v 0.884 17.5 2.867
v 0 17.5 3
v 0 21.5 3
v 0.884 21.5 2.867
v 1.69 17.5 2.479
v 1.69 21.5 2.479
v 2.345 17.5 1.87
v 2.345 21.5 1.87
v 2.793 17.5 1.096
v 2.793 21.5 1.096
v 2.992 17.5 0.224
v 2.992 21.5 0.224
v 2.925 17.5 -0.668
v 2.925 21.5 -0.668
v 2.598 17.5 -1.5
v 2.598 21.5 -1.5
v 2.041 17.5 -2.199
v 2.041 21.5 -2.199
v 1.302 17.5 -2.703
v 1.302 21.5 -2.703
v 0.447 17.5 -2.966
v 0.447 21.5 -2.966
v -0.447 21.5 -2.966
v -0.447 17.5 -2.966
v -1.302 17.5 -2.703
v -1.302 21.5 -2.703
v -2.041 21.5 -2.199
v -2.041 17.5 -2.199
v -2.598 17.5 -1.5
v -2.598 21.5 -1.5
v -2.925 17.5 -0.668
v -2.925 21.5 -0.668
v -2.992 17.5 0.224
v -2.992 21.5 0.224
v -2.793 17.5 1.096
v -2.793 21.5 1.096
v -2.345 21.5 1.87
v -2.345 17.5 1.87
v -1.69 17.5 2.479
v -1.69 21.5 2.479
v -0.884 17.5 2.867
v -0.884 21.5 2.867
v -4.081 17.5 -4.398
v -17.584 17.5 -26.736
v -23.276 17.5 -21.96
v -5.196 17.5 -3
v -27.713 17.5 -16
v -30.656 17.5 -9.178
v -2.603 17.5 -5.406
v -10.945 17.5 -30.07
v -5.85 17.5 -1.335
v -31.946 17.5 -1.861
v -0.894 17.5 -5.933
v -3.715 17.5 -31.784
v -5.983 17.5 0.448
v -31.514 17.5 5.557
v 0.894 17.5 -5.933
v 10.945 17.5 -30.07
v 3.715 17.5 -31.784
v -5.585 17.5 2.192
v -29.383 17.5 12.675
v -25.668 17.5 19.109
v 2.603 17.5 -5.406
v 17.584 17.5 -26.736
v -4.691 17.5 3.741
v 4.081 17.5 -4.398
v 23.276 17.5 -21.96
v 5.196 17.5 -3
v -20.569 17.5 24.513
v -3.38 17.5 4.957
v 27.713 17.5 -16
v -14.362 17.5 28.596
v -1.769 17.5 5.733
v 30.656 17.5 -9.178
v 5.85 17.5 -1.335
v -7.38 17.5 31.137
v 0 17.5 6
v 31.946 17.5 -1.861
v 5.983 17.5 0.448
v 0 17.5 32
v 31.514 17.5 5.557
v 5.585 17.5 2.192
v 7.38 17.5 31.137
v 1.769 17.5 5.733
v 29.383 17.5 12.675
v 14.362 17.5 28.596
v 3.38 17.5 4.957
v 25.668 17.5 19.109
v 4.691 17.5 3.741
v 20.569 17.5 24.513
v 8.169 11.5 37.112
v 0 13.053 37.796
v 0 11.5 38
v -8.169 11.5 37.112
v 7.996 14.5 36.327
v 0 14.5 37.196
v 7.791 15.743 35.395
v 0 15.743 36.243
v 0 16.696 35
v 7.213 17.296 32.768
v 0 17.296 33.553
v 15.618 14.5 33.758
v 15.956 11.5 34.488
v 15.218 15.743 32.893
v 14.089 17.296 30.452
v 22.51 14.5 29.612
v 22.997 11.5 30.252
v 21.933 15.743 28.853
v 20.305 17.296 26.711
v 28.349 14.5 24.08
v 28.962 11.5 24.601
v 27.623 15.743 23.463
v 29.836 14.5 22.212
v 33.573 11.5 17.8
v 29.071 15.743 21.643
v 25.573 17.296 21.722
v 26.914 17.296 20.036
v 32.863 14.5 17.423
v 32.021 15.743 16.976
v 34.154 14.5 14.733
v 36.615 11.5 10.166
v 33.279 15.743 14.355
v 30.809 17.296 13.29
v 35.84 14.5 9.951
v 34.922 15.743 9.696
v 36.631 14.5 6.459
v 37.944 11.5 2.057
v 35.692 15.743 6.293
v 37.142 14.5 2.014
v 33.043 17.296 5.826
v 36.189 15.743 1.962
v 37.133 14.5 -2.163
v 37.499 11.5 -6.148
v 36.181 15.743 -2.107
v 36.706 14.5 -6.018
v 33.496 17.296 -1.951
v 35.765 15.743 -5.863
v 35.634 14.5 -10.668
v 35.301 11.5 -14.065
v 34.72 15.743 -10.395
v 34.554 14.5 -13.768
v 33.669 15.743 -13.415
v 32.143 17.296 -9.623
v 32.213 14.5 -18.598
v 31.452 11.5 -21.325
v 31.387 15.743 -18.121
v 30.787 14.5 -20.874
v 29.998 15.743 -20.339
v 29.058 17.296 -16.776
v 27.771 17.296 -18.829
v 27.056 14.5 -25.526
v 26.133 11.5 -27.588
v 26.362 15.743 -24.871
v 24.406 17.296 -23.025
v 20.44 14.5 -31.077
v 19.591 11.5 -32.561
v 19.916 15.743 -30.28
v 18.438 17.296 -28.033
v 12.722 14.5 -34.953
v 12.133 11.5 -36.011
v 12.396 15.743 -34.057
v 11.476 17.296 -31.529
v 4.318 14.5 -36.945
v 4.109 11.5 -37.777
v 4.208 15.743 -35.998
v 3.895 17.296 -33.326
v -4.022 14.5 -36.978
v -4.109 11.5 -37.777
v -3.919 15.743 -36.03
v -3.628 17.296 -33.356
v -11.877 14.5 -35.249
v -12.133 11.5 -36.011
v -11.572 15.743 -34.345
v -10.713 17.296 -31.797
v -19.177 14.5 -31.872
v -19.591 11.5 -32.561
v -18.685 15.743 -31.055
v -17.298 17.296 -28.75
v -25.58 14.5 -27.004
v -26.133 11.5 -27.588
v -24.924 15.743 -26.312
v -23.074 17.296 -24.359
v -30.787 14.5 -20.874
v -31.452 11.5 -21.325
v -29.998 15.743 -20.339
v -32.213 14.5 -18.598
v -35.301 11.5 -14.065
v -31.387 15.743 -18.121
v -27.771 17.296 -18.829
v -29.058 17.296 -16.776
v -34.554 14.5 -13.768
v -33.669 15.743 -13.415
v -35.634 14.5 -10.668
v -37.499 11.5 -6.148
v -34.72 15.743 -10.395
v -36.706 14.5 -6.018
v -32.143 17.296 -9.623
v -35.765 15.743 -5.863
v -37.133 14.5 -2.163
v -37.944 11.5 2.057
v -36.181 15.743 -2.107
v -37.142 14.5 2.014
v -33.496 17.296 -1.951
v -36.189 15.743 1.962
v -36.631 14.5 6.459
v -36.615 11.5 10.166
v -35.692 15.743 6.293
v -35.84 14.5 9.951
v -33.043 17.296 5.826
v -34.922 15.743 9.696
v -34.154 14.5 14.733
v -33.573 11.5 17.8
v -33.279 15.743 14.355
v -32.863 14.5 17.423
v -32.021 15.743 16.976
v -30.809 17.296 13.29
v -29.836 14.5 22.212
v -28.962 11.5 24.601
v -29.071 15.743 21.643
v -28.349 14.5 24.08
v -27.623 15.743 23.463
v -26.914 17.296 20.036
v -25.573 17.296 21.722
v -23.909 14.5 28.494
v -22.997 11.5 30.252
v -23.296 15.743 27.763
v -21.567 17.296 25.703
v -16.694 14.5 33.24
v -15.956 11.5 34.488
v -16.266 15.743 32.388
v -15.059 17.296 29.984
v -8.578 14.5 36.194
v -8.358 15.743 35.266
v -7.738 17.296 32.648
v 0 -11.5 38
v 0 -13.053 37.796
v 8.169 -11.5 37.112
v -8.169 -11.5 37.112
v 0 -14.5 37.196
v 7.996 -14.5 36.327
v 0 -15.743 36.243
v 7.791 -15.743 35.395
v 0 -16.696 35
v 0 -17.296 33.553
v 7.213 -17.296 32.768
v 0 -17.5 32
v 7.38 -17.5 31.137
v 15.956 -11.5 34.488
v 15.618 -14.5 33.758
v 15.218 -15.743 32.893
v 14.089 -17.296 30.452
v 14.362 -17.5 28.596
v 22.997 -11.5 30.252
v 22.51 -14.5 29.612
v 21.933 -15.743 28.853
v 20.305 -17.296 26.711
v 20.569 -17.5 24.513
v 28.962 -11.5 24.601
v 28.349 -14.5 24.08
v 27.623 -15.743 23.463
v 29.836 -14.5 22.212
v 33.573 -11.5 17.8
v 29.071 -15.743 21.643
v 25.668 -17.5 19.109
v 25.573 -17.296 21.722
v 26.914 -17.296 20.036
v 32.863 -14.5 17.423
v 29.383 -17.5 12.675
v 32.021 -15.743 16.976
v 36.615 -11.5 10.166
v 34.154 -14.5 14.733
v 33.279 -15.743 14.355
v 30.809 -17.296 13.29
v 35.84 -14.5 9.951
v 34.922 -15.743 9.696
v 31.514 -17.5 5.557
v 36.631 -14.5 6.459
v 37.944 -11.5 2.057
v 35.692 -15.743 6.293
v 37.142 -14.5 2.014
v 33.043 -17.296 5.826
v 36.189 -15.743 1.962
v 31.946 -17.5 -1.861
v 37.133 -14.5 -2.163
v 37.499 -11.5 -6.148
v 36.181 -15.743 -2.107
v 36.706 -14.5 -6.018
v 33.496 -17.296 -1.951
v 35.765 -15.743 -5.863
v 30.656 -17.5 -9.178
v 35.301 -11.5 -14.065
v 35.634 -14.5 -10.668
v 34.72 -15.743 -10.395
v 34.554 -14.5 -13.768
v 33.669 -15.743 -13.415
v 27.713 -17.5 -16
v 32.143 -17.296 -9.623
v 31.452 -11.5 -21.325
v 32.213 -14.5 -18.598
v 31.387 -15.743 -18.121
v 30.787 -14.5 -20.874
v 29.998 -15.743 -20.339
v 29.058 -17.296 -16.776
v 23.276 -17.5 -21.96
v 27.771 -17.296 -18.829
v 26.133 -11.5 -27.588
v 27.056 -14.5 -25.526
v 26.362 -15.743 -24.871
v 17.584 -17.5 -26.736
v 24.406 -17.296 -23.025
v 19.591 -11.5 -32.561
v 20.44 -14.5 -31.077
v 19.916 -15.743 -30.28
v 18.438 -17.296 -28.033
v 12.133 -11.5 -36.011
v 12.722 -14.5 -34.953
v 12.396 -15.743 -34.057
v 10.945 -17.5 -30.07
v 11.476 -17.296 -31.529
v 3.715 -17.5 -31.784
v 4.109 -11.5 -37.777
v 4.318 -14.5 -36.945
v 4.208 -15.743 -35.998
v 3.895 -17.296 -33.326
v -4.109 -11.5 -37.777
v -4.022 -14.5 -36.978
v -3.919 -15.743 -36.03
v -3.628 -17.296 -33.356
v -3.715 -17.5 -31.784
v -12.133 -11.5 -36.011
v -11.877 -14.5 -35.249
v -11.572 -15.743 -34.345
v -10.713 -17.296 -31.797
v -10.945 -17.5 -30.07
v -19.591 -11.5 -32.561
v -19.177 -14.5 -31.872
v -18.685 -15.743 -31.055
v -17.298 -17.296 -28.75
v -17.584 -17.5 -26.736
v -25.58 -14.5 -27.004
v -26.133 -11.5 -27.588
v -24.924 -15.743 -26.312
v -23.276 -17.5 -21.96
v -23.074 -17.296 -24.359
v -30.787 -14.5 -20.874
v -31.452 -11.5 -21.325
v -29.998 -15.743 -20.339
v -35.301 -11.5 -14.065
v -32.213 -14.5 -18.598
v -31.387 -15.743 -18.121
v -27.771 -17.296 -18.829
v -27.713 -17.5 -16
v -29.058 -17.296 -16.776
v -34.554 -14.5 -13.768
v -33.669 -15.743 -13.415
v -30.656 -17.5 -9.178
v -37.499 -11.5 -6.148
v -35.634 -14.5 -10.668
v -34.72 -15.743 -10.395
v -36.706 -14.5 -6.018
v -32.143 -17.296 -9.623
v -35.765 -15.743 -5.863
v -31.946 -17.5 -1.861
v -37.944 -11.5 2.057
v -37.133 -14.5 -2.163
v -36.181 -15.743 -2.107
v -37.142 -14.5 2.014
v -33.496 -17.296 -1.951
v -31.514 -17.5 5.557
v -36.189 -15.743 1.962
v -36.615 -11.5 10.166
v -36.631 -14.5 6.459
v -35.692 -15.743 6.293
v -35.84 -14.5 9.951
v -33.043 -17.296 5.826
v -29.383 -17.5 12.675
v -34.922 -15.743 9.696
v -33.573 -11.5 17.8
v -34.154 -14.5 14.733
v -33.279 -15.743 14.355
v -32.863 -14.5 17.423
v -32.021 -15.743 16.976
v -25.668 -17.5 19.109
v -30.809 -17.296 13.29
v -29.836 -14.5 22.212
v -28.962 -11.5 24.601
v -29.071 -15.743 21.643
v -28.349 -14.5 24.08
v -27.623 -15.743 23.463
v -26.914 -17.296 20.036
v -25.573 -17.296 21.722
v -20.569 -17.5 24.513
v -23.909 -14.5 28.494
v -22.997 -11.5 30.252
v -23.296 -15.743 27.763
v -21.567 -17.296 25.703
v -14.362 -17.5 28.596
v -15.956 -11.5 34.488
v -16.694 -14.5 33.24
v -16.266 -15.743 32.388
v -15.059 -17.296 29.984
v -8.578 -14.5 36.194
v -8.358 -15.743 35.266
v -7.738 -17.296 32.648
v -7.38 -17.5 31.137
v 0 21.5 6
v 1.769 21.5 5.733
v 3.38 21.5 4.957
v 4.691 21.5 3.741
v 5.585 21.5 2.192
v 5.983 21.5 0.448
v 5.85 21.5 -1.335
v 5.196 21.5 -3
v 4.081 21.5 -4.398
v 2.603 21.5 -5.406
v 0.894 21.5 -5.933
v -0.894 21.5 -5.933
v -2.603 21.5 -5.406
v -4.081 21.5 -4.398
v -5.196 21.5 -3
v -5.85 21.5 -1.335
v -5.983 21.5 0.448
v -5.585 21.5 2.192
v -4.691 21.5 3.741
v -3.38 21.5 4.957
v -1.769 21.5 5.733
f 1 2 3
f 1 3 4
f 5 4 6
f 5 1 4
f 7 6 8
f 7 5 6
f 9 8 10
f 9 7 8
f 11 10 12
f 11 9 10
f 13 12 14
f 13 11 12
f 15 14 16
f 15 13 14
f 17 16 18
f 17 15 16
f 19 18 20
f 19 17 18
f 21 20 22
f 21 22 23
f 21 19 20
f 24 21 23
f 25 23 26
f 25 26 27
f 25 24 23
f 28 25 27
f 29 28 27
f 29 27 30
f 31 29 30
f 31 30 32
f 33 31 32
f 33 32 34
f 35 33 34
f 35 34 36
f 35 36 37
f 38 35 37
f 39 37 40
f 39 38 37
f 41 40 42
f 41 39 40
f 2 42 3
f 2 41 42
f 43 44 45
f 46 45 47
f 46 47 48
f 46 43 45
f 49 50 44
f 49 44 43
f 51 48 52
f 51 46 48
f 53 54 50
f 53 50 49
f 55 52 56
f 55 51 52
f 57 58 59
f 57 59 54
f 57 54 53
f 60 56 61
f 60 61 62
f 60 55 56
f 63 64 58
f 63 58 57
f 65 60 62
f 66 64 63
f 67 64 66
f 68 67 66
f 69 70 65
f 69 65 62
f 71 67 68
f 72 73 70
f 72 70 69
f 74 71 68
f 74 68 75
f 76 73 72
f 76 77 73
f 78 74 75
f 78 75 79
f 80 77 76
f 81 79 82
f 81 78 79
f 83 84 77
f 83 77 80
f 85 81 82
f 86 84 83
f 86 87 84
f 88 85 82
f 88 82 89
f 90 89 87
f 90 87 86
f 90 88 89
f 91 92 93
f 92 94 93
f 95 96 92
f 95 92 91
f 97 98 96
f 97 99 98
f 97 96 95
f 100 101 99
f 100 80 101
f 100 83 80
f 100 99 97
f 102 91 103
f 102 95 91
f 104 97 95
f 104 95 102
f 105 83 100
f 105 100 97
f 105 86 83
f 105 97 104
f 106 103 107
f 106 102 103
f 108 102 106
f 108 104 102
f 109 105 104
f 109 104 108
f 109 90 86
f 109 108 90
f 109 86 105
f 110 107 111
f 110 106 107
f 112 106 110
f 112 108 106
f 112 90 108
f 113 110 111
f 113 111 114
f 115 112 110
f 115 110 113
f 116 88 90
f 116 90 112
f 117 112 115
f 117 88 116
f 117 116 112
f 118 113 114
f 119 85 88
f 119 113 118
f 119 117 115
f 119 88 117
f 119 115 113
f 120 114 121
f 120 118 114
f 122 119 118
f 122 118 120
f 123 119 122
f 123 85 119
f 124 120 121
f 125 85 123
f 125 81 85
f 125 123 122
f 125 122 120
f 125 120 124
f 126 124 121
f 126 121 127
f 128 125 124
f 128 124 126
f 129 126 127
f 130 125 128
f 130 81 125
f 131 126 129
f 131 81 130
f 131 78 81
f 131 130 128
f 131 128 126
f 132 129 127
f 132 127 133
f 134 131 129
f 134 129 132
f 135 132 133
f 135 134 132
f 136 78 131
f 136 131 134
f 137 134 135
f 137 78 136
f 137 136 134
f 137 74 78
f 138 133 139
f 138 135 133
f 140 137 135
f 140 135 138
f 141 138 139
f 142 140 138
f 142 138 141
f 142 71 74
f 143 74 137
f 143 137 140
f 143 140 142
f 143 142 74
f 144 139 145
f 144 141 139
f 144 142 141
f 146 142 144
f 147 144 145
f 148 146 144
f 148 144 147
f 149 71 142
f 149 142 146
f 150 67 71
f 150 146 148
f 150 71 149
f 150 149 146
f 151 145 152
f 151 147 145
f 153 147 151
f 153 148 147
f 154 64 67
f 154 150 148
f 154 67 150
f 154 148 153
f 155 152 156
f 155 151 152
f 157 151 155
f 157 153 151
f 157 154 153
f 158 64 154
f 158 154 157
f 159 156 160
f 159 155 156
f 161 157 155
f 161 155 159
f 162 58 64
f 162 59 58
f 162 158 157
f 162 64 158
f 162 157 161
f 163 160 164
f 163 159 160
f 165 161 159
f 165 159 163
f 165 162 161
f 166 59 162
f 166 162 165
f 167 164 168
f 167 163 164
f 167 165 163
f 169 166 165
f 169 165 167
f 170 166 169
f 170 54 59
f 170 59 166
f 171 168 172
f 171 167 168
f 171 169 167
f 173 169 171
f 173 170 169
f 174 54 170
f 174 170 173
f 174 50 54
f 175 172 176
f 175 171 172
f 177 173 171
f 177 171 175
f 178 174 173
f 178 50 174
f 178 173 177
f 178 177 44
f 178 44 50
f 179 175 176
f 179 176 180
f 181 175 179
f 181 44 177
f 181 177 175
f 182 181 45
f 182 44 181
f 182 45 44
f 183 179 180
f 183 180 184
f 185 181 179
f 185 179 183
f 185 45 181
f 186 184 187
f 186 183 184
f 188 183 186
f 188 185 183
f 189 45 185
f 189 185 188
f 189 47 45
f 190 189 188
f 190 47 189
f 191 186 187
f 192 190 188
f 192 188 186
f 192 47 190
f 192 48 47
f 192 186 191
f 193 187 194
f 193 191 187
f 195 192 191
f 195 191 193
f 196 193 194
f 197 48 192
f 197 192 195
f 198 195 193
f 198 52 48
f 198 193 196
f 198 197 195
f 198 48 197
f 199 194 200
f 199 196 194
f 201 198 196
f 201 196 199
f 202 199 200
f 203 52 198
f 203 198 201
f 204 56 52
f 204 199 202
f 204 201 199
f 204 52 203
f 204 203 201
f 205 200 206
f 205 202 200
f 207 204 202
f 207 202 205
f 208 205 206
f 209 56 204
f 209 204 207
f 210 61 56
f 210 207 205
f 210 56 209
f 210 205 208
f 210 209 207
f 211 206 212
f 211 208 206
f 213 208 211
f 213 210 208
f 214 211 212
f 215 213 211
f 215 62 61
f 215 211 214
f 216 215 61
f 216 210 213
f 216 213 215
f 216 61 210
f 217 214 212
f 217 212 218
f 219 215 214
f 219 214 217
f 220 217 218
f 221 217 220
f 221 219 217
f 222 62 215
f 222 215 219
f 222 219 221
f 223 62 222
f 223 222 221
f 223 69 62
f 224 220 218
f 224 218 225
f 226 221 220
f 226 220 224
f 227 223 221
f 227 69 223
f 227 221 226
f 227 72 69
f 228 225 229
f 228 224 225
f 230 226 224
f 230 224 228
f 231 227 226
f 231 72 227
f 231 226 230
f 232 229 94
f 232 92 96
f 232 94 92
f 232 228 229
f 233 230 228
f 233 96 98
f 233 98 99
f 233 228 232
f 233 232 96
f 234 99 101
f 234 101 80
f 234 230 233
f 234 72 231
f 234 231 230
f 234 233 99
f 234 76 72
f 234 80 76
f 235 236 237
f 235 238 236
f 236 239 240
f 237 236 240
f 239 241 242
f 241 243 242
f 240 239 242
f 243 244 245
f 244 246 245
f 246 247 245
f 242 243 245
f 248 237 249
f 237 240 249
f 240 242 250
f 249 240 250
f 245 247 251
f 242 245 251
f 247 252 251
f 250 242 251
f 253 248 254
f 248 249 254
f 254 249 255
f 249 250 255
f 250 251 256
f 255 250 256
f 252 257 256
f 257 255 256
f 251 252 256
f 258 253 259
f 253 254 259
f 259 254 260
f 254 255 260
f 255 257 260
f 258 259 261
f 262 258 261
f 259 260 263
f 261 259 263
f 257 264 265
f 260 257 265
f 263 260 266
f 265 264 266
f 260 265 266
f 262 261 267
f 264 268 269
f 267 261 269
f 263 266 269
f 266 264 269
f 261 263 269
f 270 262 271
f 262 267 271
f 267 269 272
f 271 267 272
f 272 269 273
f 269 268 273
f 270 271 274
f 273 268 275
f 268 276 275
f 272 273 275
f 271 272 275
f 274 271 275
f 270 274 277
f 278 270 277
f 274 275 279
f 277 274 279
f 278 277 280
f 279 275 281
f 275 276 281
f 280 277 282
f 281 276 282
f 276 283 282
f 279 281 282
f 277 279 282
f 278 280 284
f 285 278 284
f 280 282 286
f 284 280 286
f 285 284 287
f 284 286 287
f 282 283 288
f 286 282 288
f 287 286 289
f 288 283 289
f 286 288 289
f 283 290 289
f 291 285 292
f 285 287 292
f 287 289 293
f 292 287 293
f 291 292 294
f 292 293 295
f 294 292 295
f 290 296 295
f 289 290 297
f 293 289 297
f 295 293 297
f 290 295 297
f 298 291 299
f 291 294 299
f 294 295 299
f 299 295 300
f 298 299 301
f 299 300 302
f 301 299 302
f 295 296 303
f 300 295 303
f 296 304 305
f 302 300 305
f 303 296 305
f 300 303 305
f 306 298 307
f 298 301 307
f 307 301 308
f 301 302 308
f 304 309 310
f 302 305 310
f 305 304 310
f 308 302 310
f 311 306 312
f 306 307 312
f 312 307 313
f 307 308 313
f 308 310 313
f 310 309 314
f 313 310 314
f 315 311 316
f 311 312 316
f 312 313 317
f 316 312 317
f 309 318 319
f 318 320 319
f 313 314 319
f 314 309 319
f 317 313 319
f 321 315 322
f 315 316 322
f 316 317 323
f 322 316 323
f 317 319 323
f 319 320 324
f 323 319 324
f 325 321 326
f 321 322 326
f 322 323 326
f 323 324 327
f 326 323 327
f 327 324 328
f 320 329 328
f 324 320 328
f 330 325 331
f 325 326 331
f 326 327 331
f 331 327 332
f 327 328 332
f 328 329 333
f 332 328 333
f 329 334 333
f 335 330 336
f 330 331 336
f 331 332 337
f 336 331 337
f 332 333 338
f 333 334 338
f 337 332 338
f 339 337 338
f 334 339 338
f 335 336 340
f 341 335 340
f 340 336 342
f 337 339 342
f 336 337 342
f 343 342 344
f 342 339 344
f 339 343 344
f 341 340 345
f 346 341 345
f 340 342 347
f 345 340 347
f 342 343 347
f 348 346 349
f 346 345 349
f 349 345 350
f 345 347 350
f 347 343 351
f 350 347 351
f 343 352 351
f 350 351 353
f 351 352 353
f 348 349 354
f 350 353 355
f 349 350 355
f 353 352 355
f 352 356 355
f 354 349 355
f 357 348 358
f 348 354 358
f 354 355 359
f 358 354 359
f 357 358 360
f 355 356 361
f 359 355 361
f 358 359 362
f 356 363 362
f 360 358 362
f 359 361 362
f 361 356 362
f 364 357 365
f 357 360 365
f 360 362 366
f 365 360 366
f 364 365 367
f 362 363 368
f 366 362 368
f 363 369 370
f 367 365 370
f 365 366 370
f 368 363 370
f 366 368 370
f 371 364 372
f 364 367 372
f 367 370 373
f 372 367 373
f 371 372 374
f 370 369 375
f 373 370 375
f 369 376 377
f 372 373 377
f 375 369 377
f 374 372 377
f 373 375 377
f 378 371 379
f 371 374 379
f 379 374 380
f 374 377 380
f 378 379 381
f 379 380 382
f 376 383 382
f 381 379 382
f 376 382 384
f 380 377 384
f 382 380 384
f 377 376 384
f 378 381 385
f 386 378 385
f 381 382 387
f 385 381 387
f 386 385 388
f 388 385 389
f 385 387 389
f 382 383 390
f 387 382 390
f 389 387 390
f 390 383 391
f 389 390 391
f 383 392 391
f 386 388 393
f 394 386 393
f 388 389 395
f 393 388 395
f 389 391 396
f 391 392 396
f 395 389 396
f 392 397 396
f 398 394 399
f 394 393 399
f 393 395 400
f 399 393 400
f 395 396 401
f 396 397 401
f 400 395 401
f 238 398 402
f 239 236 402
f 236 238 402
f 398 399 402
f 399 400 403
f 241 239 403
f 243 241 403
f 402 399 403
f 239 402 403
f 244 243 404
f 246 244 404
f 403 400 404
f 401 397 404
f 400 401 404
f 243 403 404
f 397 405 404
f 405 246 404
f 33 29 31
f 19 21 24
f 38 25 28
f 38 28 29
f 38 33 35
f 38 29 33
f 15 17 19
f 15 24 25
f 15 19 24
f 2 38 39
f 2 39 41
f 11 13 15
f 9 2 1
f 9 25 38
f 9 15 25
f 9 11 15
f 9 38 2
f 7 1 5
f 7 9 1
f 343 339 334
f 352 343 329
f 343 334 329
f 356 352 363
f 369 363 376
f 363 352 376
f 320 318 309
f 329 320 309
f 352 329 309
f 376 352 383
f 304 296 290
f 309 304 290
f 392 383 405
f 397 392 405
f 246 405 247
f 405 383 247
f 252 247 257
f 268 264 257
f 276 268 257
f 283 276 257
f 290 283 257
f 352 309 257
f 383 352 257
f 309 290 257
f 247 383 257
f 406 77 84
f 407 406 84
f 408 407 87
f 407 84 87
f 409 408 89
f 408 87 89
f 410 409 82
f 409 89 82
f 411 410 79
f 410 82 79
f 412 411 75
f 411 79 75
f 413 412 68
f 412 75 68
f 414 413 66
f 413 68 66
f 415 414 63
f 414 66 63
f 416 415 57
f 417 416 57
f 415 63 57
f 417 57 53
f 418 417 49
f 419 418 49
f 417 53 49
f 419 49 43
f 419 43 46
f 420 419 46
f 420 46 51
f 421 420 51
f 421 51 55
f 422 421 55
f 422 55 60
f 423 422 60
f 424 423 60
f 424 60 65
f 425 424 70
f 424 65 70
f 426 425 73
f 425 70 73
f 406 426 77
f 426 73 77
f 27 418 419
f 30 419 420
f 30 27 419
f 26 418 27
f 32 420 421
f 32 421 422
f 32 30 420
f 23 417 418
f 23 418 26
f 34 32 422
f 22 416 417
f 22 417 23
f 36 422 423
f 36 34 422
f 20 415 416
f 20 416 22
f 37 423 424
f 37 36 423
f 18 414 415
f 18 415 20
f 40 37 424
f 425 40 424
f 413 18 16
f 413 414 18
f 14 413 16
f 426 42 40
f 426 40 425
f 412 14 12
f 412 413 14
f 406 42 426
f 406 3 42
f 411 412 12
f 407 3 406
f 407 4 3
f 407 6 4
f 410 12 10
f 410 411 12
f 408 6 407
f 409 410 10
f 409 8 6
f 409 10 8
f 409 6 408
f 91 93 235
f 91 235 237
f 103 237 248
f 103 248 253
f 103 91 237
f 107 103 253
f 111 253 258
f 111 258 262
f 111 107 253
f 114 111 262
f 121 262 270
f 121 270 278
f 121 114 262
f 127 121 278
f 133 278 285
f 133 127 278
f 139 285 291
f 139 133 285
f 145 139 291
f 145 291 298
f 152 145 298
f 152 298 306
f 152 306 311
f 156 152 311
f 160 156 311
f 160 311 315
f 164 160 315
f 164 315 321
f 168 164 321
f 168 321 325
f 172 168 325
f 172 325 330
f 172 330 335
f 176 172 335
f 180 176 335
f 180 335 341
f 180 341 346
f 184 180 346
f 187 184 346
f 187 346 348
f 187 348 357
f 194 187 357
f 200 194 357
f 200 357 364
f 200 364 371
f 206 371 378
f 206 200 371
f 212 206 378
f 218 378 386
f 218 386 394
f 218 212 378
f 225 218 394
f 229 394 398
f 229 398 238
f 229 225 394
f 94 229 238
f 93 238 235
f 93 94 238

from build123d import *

# Parameters (mm, degrees)
SKETCH_1_R      = 38
EXTRUDE_1_DEPTH = 17.5
SKETCH_2_R      = 6
SKETCH_2_R_2    = 3
EXTRUDE_2_DEPTH = 4
FILLET_1_R      = 6


with BuildPart() as part:
    # 草图1 → 凸台-拉伸1 (new, symmetric)
    with BuildSketch(Plane(origin=(0, 0, 0), x_dir=(1, 0, 0), z_dir=(0, 1, 0))):
        with Locations(Location((0, 0, 0), (0, 0, 270))):
            Circle(SKETCH_1_R)
    extrude(amount=EXTRUDE_1_DEPTH, both=True)

    # 草图2 → 凸台-拉伸2 (add)
    with BuildSketch(Plane(origin=(0, 17.5, 0), x_dir=(1, 0, 0), z_dir=(0, 1, 0))):
        with Locations(Location((0, 0, 0), (0, 0, 270))):
            Circle(SKETCH_2_R)
        with Locations(Location((0, 0, 0), (0, 0, 270))):
            Circle(SKETCH_2_R_2, mode=Mode.SUBTRACT)
    extrude(amount=EXTRUDE_2_DEPTH)

    # 圆角1
    fillet_1_edges = [part.edges().sort_by_distance(p)[0] for p in [
        (0, -17.5, -38),
        (0, 17.5, -38),
    ]]
    fillet(fillet_1_edges, radius=FILLET_1_R)


solid = part.part
